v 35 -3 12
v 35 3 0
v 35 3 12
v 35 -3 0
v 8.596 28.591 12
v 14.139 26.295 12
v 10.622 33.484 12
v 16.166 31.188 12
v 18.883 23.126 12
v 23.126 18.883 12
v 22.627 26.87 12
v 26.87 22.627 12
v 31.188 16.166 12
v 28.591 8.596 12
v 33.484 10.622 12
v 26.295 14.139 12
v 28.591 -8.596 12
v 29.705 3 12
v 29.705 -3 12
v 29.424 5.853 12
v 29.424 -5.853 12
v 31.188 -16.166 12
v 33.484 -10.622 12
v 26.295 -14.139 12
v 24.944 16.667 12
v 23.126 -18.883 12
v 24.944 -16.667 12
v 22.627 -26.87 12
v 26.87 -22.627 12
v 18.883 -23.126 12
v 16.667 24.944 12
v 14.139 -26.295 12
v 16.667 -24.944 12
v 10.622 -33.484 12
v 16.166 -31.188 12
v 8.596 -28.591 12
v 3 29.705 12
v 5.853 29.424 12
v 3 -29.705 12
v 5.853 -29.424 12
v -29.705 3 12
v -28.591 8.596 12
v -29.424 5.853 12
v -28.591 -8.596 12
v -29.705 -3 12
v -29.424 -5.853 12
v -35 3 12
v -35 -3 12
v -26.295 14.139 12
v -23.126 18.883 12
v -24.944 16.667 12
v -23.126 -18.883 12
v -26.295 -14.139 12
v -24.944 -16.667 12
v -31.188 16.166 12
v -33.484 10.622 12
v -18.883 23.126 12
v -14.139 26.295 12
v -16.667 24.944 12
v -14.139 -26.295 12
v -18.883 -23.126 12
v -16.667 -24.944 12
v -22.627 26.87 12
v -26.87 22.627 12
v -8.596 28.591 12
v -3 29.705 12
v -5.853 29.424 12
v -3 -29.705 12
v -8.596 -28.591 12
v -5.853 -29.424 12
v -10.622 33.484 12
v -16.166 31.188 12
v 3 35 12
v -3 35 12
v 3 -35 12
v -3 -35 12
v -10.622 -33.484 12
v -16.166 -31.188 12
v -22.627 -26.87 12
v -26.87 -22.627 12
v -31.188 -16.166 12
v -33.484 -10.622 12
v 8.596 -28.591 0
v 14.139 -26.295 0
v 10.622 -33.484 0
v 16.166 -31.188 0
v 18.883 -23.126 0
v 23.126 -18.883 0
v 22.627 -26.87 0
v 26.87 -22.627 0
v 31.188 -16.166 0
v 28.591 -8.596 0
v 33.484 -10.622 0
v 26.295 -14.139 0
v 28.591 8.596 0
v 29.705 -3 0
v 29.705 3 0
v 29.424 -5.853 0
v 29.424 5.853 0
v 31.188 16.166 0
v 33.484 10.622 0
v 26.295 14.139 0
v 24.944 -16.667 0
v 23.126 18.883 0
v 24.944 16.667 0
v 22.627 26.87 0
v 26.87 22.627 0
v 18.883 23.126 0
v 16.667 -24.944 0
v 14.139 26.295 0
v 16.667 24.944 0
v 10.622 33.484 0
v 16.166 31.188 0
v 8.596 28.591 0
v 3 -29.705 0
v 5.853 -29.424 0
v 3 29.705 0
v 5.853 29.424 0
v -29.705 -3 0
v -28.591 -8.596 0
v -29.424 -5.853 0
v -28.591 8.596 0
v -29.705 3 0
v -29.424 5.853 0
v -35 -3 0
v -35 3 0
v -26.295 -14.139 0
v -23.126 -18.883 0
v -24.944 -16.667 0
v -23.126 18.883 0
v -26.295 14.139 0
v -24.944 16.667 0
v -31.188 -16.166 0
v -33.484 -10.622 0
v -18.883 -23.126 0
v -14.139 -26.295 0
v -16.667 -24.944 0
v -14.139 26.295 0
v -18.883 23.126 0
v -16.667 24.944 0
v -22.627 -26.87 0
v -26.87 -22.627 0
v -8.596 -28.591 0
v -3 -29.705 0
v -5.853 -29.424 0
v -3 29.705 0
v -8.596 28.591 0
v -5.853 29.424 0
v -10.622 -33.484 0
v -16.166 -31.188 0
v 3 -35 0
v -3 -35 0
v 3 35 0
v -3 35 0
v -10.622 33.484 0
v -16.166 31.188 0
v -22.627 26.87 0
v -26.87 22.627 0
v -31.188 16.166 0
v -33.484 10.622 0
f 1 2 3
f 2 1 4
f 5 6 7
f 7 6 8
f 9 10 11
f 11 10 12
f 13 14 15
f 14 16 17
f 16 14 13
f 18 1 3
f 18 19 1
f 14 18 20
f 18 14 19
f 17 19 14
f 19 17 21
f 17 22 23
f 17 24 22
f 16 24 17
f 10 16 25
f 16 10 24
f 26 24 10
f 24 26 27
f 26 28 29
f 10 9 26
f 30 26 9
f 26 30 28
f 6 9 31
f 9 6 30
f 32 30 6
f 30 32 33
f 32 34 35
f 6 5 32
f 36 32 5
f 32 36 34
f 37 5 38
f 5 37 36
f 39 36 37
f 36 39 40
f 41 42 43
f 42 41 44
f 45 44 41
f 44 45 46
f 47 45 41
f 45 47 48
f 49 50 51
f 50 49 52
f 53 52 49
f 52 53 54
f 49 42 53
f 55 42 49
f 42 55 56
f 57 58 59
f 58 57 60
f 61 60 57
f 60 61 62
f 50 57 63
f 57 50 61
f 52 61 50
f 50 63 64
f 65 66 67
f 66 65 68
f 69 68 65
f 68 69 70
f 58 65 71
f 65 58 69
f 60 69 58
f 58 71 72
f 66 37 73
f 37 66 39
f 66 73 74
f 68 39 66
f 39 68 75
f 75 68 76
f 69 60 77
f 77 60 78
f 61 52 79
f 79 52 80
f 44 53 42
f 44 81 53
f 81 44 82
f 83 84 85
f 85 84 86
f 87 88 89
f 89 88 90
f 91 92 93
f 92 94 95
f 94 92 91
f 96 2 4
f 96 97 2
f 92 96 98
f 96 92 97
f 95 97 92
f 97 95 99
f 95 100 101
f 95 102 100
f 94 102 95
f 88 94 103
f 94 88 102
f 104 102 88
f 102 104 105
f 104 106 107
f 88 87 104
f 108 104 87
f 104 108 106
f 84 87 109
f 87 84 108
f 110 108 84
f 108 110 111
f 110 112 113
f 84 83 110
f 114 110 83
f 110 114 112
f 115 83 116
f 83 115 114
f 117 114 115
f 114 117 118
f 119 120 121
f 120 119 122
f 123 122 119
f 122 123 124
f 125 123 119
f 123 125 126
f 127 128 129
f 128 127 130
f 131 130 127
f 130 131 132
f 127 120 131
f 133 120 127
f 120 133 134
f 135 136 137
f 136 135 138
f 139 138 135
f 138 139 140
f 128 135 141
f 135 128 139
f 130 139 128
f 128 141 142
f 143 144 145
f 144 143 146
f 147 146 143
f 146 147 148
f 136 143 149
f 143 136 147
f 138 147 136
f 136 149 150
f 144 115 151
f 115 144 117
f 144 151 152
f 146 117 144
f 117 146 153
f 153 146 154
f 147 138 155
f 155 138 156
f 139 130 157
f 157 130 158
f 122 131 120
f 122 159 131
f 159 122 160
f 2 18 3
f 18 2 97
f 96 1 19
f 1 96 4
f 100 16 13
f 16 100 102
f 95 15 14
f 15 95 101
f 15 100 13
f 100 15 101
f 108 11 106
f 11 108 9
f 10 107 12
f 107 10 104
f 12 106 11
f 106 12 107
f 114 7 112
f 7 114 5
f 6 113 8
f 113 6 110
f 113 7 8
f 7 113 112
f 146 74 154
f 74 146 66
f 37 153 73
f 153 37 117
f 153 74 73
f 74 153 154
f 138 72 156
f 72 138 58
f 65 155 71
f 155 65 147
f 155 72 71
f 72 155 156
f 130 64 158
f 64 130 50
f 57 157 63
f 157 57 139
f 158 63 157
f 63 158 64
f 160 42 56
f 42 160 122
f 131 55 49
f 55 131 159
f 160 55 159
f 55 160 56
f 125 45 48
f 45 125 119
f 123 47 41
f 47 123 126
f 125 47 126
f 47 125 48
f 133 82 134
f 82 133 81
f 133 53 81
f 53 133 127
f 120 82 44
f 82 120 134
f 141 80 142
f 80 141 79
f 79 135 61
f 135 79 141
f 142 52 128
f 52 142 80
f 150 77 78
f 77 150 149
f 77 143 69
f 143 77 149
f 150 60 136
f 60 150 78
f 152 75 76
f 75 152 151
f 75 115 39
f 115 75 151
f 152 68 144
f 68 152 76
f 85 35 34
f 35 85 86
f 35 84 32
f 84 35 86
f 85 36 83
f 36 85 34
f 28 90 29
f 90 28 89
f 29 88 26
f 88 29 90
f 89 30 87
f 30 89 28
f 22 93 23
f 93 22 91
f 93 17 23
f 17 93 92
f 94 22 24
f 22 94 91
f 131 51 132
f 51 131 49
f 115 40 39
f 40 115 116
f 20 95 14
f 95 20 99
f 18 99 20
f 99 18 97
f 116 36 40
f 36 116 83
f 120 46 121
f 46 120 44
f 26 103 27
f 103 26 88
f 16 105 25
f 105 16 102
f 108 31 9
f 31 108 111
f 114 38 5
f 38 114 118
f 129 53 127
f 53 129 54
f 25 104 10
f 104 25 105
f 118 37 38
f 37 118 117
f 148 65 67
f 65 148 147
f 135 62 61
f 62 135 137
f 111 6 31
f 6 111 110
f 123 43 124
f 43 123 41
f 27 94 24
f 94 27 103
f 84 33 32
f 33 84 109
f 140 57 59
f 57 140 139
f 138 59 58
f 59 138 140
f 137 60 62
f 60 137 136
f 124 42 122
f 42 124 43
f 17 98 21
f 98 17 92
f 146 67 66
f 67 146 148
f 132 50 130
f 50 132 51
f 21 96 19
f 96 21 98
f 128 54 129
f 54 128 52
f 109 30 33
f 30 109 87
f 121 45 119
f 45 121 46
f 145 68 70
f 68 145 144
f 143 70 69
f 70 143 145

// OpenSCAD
$fn = 32;

// ----------------------------------------------------------------------
// Spur blank: plain gear blank
// ----------------------------------------------------------------------

// --- parameters (mm) ---
disc_r = 30;              // blank root radius
disc_t = 12;              // blank thickness
n_teeth = 16;             // stub tooth count
tooth_w = 6;              // tooth width at the root
tooth_h = 5;              // tooth height above the root

out_r = disc_r + tooth_h;  // tip radius
bbox_x = 70.0;  // measured width over the teeth
bbox_y = 70.0;  // measured depth over the teeth

union() {
  cylinder(r = disc_r, h = disc_t);
  for (i = [0 : n_teeth - 1])
    rotate([0, 0, i * 360 / n_teeth])
      translate([disc_r - 1, -tooth_w / 2, 0])
        cube([tooth_h + 1, tooth_w, disc_t]);
}
